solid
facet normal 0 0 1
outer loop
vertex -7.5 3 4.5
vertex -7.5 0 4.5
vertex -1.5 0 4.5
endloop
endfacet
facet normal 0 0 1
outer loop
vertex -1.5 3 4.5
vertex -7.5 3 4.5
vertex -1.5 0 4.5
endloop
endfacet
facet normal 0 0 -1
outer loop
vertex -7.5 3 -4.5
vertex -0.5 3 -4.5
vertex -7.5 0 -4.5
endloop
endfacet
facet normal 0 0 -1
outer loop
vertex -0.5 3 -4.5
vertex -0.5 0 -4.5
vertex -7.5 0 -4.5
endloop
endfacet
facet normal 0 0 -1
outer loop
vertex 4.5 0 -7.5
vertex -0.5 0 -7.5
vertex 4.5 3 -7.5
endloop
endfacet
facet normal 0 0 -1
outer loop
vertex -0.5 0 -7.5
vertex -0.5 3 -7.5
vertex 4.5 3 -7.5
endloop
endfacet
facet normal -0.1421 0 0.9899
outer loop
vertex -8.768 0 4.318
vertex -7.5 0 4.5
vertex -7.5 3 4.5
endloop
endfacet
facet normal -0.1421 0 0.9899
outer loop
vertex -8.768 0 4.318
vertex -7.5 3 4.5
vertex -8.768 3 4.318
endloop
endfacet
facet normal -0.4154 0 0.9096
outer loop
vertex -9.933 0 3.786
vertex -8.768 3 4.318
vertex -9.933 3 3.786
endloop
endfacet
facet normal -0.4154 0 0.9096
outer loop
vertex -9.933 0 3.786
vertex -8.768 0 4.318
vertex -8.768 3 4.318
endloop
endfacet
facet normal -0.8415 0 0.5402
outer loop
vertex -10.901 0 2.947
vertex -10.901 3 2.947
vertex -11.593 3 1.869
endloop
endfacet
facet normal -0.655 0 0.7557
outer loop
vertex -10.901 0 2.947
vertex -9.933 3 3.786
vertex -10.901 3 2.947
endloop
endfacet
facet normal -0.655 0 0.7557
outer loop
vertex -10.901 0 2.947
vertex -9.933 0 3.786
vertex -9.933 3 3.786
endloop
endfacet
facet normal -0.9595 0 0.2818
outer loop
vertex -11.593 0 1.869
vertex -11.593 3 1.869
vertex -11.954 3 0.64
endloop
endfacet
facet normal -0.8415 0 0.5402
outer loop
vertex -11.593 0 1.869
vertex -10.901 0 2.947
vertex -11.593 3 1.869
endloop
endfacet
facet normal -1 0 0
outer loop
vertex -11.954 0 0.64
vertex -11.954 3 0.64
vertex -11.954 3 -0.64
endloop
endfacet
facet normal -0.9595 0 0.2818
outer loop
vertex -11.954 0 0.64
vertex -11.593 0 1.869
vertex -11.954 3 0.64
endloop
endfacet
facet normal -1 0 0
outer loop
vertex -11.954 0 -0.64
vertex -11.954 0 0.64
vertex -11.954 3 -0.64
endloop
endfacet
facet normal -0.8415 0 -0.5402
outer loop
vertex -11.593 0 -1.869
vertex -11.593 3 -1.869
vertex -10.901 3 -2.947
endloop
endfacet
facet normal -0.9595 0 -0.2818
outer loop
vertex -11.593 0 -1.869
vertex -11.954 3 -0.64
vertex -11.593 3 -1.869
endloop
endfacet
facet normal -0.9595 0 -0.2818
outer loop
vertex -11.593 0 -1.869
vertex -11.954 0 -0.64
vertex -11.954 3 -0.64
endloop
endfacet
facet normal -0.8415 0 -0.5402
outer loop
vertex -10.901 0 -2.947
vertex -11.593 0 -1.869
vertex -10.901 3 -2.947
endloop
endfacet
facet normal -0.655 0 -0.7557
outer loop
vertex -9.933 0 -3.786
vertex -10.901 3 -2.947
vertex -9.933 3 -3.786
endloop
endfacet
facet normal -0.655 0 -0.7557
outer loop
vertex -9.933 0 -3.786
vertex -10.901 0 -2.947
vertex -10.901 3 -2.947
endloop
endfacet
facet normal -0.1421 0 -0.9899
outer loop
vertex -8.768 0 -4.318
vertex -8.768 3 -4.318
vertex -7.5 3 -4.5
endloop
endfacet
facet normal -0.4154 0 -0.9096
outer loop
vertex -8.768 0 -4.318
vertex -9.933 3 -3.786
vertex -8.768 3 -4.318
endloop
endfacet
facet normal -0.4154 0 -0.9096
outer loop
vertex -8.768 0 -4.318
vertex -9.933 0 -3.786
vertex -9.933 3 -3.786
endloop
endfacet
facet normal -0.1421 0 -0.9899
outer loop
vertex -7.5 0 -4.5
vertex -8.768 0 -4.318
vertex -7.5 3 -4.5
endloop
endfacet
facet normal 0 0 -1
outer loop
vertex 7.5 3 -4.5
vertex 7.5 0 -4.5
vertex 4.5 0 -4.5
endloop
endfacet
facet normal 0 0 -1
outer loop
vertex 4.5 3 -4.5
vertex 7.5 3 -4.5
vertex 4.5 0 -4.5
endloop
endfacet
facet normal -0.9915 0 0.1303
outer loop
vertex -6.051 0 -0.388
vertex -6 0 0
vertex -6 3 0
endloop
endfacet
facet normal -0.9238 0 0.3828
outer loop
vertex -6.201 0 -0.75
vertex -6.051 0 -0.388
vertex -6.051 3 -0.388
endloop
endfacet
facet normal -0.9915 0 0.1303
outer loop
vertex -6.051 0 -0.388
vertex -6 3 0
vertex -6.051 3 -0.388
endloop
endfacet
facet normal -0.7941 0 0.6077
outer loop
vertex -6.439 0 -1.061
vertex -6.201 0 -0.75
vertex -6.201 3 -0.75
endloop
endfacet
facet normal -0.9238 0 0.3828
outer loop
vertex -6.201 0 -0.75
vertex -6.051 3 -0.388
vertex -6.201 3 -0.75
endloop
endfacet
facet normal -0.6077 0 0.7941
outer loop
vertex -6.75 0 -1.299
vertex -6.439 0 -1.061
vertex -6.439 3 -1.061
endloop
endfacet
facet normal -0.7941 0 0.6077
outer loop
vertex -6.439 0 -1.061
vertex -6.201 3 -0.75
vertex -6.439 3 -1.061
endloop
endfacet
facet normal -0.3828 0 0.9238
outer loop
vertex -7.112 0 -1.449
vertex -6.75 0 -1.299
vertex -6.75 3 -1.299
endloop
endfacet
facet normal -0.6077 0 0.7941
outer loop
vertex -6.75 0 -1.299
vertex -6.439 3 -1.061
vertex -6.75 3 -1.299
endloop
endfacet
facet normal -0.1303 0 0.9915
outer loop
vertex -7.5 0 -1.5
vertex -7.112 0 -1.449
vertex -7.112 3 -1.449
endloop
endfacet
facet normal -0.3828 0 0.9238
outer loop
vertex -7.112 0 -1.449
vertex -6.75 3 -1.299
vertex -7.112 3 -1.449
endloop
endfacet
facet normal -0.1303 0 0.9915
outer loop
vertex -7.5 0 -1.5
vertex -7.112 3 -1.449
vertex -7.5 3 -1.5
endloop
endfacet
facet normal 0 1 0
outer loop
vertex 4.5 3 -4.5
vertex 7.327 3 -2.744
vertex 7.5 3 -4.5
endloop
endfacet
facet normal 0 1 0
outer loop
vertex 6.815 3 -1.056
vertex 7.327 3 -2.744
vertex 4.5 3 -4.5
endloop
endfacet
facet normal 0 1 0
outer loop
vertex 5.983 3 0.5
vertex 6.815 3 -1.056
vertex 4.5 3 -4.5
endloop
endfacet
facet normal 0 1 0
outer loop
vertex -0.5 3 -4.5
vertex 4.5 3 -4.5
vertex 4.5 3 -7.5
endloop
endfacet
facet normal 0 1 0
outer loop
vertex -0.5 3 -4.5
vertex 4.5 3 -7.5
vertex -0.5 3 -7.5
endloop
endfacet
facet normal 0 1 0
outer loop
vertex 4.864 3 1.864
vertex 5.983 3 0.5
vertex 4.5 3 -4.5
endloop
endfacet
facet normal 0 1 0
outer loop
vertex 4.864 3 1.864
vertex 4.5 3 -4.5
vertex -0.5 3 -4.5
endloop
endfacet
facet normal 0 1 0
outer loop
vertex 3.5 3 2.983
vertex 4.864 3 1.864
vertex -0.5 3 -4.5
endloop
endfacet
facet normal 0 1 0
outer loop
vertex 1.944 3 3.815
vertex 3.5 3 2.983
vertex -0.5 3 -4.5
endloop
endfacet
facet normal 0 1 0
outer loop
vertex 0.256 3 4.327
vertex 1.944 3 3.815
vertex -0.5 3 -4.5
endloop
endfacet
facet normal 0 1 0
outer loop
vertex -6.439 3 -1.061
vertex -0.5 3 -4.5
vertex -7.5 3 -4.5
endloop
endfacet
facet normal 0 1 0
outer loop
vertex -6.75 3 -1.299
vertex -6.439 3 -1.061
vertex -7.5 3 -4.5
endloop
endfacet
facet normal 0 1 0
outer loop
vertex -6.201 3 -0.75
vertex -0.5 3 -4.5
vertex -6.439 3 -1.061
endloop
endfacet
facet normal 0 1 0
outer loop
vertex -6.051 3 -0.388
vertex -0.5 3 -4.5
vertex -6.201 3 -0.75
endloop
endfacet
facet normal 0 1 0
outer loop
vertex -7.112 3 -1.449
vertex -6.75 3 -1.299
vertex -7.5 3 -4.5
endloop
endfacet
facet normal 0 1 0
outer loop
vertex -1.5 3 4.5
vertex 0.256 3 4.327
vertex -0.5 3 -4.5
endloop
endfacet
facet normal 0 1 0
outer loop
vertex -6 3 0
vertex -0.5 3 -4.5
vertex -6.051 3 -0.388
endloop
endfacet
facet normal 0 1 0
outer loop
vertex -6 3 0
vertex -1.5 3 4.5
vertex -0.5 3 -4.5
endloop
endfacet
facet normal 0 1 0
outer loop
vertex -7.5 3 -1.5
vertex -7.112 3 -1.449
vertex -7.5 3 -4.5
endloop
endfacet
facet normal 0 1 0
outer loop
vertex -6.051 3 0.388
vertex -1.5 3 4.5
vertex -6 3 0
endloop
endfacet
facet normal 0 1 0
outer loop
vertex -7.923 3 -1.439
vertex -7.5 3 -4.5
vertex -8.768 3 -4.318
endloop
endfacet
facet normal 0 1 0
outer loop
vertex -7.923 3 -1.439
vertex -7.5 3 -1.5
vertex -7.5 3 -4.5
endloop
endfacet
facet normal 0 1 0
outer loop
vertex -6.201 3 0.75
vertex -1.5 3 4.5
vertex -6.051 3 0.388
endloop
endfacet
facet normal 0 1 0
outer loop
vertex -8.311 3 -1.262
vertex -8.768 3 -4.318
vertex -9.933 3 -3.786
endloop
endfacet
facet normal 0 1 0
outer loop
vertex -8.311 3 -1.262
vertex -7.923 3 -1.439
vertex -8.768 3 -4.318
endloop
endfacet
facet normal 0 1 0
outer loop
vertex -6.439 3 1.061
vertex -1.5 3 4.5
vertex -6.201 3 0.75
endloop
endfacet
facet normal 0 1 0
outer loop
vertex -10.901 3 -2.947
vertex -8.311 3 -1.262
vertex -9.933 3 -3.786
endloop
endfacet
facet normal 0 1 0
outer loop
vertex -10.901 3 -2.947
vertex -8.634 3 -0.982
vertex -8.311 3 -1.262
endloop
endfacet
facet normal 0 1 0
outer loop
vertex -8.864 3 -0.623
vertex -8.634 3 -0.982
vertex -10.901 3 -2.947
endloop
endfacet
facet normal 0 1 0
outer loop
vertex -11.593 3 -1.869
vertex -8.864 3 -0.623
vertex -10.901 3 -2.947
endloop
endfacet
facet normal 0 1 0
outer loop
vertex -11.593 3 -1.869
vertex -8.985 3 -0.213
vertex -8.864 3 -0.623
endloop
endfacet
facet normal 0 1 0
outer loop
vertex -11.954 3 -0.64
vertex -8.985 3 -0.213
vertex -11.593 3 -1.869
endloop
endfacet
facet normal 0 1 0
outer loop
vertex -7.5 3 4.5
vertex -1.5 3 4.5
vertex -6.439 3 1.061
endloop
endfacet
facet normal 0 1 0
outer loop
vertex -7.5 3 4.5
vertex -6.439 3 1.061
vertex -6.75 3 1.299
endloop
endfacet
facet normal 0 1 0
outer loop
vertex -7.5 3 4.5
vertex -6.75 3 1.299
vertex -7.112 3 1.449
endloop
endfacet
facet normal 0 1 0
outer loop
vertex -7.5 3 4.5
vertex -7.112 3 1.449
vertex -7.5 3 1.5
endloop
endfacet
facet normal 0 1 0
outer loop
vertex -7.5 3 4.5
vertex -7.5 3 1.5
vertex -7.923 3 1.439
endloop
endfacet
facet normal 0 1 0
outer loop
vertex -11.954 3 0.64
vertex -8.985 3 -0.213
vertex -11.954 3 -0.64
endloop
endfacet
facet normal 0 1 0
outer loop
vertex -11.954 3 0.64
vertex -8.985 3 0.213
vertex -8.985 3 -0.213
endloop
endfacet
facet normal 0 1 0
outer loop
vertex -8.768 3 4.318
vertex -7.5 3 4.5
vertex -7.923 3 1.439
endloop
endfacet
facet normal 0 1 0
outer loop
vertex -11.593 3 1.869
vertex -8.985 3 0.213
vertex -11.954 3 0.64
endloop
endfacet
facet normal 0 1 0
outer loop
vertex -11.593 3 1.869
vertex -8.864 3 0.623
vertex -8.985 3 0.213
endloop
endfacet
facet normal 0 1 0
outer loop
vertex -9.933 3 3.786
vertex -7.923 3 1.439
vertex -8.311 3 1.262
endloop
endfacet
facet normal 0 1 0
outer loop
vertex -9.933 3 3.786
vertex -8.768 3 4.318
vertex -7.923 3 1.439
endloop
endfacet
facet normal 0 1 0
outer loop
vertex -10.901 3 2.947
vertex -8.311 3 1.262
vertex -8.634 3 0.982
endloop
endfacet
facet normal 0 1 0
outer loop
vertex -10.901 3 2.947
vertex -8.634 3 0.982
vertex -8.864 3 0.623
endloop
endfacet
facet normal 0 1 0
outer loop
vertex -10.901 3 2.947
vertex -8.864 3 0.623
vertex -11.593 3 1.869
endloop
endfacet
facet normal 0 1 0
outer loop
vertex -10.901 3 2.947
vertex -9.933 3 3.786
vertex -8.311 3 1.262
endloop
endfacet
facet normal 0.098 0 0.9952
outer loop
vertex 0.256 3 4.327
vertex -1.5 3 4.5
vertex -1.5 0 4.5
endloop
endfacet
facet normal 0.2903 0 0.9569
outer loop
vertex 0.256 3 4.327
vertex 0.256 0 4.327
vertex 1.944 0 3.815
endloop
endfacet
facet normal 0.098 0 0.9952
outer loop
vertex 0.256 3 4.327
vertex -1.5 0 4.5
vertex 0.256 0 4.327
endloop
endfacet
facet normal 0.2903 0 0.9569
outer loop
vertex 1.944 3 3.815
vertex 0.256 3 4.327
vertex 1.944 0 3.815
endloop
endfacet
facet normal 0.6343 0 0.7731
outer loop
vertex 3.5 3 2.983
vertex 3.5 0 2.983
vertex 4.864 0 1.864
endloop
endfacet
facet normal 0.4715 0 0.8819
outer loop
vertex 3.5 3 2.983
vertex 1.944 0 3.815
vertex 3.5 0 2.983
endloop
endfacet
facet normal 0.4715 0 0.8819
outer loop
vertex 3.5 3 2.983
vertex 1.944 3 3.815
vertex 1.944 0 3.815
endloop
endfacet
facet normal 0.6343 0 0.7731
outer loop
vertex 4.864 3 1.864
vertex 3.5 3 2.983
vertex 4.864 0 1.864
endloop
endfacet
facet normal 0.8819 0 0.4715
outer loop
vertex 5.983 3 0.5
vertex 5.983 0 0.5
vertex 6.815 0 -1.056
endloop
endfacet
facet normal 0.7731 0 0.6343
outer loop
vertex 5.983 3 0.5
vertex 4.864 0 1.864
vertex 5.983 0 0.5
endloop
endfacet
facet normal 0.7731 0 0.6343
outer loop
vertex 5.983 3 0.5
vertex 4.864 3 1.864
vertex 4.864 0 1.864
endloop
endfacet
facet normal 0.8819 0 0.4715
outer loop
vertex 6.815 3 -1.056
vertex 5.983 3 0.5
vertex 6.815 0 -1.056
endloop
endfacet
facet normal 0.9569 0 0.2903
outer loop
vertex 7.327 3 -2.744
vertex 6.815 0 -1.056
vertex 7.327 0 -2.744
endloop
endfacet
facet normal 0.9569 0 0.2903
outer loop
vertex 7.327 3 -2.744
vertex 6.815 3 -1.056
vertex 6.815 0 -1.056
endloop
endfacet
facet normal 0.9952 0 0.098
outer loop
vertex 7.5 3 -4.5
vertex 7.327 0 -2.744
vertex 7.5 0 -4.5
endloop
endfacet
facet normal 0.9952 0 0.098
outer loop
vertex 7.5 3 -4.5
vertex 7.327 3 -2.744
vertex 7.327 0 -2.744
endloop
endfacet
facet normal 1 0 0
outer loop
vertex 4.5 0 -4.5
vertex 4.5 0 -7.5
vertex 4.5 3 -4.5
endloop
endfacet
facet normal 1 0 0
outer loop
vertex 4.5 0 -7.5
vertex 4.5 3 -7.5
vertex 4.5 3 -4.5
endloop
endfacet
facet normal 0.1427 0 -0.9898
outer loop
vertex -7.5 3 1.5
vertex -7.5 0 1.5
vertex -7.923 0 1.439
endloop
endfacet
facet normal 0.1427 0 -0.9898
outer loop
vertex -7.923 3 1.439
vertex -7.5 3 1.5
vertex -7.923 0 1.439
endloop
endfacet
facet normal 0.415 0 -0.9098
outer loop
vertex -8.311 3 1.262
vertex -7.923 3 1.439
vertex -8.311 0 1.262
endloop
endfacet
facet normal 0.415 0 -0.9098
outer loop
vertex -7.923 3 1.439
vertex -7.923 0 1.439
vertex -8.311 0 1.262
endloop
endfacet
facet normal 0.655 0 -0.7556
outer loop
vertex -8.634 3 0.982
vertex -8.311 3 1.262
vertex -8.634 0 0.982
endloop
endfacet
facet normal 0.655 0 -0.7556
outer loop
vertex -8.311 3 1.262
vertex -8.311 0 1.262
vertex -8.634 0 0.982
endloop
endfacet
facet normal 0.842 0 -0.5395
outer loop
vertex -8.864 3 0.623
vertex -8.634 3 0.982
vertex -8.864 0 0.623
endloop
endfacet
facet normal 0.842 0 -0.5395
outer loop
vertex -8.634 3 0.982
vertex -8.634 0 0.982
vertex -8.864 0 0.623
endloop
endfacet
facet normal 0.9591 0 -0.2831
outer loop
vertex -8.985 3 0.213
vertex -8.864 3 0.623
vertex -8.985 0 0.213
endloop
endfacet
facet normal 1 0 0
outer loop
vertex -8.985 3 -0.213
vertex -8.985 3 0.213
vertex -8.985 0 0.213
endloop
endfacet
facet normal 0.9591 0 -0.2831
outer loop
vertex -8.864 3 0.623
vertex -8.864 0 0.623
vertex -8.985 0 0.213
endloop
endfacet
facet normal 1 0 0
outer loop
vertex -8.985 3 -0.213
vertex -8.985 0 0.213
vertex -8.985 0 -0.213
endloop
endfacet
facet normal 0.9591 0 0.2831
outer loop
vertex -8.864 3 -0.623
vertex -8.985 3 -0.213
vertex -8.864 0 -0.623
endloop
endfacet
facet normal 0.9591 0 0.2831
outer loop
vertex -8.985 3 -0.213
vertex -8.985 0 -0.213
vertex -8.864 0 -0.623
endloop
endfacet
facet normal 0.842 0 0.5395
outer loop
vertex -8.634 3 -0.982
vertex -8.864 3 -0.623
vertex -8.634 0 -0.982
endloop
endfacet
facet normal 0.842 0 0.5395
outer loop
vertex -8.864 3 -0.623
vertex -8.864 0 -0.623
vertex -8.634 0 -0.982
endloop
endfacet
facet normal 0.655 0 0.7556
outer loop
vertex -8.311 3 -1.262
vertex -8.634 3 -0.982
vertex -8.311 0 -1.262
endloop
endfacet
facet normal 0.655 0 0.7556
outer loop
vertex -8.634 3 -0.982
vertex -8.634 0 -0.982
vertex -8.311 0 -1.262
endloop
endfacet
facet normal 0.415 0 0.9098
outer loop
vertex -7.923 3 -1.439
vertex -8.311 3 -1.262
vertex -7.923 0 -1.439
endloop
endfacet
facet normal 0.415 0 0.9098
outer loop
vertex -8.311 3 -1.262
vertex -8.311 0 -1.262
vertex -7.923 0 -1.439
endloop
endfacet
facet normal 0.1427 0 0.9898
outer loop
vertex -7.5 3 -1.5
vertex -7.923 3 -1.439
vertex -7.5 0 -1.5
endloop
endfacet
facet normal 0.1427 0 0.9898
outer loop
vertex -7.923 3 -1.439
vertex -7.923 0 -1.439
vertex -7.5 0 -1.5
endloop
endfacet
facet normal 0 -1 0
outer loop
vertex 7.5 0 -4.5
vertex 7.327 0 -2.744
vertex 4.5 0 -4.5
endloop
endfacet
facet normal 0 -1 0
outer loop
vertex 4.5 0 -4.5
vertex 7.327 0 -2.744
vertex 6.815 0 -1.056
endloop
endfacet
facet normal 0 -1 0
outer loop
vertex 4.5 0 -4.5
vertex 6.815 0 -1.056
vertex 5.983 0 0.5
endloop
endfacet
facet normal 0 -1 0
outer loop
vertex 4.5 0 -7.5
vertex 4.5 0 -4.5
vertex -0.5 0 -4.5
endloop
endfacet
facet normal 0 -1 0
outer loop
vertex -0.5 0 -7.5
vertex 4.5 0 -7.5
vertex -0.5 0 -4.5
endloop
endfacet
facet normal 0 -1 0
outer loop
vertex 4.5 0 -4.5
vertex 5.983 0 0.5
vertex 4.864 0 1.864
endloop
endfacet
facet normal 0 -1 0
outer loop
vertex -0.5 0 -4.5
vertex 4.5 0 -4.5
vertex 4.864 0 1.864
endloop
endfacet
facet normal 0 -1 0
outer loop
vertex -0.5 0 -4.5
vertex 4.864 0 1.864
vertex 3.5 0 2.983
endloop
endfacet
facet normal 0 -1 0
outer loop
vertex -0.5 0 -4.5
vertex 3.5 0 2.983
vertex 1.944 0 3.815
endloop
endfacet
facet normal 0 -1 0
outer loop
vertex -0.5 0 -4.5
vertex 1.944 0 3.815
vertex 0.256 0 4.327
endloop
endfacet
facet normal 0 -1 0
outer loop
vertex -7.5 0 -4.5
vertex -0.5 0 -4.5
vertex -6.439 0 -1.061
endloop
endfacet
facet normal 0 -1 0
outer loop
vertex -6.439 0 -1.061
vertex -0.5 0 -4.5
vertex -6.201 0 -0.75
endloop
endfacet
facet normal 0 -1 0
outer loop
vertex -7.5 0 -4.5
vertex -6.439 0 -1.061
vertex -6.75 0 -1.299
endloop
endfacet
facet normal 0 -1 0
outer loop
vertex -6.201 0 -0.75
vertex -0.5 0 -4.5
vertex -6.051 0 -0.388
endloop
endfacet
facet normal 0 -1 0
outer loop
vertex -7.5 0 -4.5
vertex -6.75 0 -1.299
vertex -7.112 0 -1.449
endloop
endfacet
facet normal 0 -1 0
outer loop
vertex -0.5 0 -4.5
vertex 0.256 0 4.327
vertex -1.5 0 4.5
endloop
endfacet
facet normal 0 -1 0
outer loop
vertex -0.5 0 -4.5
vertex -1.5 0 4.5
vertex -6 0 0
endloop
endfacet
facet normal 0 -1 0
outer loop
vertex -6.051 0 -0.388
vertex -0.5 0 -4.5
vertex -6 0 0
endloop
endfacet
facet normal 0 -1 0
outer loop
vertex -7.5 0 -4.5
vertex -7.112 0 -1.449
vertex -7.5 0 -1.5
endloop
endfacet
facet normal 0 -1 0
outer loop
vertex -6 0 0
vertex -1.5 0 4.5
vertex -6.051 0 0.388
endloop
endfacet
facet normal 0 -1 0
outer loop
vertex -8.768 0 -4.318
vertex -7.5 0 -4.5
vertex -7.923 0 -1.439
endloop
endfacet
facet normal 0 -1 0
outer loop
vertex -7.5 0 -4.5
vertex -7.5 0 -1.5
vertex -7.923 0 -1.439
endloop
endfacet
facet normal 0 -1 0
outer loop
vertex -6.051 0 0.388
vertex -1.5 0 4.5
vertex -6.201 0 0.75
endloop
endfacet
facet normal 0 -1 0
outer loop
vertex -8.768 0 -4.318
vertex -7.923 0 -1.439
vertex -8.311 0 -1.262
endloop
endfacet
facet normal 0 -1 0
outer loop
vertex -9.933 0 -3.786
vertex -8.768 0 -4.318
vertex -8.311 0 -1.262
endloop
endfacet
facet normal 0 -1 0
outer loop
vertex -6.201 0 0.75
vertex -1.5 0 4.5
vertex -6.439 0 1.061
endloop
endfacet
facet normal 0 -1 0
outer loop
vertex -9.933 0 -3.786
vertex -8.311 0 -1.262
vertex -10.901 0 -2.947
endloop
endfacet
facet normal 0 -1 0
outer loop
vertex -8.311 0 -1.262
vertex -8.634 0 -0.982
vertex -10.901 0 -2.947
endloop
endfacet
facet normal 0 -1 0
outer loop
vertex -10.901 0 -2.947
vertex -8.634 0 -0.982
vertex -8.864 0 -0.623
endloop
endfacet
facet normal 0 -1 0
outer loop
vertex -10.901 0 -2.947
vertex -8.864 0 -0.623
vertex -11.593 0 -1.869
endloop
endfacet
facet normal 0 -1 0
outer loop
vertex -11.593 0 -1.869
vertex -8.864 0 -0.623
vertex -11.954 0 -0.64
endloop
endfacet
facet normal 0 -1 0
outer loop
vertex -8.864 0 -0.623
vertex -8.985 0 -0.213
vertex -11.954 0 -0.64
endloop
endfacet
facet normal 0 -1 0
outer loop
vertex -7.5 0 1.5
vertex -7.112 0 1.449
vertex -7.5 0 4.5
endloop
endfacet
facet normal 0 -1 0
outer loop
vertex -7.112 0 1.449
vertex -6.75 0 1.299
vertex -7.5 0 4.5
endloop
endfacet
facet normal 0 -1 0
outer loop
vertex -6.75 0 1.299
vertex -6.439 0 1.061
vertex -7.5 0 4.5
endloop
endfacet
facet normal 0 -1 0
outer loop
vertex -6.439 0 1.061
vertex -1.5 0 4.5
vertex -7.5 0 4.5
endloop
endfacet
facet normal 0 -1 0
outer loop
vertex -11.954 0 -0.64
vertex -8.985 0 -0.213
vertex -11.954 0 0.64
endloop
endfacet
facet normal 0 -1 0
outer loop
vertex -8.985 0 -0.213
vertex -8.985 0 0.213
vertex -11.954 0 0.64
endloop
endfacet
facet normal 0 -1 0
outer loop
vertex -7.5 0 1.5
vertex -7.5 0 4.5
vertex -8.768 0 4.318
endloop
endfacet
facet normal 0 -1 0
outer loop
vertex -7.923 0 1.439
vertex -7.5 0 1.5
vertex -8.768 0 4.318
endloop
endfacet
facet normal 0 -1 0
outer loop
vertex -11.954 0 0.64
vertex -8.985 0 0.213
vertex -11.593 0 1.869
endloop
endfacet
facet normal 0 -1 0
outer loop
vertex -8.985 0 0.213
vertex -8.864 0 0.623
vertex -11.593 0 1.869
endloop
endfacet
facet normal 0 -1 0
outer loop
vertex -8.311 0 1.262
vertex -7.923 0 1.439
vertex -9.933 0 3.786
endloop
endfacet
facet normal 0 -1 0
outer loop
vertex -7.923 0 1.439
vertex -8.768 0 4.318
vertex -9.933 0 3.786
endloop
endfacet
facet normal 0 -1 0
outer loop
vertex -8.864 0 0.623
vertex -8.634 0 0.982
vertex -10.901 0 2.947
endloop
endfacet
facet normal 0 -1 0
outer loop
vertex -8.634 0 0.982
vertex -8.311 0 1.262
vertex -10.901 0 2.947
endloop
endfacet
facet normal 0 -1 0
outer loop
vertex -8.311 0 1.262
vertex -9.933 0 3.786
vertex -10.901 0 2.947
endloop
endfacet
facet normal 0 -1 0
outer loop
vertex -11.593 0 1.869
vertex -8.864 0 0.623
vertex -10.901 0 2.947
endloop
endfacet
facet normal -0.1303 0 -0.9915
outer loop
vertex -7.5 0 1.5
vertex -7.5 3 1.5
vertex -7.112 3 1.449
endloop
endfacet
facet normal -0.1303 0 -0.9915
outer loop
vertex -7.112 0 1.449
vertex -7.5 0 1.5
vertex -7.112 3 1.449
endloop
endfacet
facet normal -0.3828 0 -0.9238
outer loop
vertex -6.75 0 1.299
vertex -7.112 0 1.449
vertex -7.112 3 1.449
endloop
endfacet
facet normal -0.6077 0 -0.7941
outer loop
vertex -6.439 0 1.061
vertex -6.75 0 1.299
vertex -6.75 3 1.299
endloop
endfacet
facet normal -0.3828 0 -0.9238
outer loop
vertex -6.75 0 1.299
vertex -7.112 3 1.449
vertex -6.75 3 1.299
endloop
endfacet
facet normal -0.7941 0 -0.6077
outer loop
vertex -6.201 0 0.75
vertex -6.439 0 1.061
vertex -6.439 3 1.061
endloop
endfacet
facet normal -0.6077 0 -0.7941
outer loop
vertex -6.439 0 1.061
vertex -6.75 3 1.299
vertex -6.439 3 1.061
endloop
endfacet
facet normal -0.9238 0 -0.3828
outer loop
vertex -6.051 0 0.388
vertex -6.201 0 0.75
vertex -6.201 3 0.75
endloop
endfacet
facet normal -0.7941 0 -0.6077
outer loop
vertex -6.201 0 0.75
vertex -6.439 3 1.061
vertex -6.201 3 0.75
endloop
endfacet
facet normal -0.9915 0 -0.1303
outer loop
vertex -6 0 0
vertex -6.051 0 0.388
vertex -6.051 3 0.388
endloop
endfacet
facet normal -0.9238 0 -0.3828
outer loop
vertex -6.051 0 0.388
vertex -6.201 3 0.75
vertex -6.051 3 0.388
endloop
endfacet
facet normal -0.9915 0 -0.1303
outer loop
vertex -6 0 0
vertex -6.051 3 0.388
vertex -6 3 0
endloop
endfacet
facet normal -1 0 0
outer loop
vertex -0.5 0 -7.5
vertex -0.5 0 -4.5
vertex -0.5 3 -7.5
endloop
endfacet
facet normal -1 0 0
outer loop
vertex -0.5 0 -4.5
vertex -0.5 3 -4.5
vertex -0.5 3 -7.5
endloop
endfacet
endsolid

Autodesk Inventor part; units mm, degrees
ref_plane "YZ Plane" through (0, 0, 0) normal (1, 0, 0) x (0, 1, 0)
ref_plane "XZ Plane" through (0, 0, 0) normal (0, 1, 0) x (-1, 0, 0)
ref_plane "XY Plane" through (0, 0, 0) normal (0, 0, 1) x (1, 0, 0)
sketch "Sketch1" plane through (0, 0, 0) normal (0, 1, 0) x (-1, 0, 0)
  line L0 (-7.5, -4.5) -> (7.5, -4.5)
  line L1 (7.5, -4.5) -> (7.5, 4.5)
  line L2 (7.5, 4.5) -> (-7.5, 4.5)
  line L3 (-7.5, 4.5) -> (-7.5, -4.5)
  line L4 (-7.5, -4.5) -> (7.5, 4.5) construction
  line L5 (7.5, -4.5) -> (-7.5, 4.5) construction
  circle A0 centre (7.5, 0) radius 1.5
  circle A1 centre (7.5, 0) radius 4.5
  point P0 (0, 0)
  dimension "d0" = 15
  dimension "d1" = 3
  dimension "d2" = 9
  dimension "d3" = 9
extrude "Extrusion1" add sketch "Sketch1" along normal blind 3 contours L3 L2 A1 L0 | A1 L1 A0 | L1 A0 A1 | A0 L1 picked at (7.0325, 0.1773)
sketch "Sketch2" plane through (0, 3, 0) normal (0, 1, 0) x (1, 0, 0)
  line L0 (-7.5, -1.5) -> (-7.5, 1.5) projected
  circle A0 centre (-7.5, 0) radius 1.5
  point P0 (0, 0)
  dimension "d6" = 3
extrude "Extrusion2" cut sketch "Sketch2" against normal blind 3
sketch "Sketch3" plane through (0, 3, 0) normal (0, 1, 0) x (1, 0, 0)
  line L0 (7.5, 4.5) -> (-7.5, 4.5) projected
  line L1 (4.5, 4.5) -> (-0.5, 4.5)
  line L2 (-0.5, 4.5) -> (-0.5, 7.5)
  line L3 (-0.5, 7.5) -> (4.5, 7.5)
  line L4 (4.5, 7.5) -> (4.5, 4.5)
  line L5 (7.5, -4.5) -> (7.5, 4.5) projected
  point P0 (0, 0)
  dimension "d9" = 5
  dimension "d10" = 3
  dimension "d11" = 3
extrude "Extrusion3" add sketch "Sketch3" against normal blind 3
fillet "Fillet1" radius 9 1 edges at (7.5, 1.5, 4.5)
properties part number "Bottom battery holder"
